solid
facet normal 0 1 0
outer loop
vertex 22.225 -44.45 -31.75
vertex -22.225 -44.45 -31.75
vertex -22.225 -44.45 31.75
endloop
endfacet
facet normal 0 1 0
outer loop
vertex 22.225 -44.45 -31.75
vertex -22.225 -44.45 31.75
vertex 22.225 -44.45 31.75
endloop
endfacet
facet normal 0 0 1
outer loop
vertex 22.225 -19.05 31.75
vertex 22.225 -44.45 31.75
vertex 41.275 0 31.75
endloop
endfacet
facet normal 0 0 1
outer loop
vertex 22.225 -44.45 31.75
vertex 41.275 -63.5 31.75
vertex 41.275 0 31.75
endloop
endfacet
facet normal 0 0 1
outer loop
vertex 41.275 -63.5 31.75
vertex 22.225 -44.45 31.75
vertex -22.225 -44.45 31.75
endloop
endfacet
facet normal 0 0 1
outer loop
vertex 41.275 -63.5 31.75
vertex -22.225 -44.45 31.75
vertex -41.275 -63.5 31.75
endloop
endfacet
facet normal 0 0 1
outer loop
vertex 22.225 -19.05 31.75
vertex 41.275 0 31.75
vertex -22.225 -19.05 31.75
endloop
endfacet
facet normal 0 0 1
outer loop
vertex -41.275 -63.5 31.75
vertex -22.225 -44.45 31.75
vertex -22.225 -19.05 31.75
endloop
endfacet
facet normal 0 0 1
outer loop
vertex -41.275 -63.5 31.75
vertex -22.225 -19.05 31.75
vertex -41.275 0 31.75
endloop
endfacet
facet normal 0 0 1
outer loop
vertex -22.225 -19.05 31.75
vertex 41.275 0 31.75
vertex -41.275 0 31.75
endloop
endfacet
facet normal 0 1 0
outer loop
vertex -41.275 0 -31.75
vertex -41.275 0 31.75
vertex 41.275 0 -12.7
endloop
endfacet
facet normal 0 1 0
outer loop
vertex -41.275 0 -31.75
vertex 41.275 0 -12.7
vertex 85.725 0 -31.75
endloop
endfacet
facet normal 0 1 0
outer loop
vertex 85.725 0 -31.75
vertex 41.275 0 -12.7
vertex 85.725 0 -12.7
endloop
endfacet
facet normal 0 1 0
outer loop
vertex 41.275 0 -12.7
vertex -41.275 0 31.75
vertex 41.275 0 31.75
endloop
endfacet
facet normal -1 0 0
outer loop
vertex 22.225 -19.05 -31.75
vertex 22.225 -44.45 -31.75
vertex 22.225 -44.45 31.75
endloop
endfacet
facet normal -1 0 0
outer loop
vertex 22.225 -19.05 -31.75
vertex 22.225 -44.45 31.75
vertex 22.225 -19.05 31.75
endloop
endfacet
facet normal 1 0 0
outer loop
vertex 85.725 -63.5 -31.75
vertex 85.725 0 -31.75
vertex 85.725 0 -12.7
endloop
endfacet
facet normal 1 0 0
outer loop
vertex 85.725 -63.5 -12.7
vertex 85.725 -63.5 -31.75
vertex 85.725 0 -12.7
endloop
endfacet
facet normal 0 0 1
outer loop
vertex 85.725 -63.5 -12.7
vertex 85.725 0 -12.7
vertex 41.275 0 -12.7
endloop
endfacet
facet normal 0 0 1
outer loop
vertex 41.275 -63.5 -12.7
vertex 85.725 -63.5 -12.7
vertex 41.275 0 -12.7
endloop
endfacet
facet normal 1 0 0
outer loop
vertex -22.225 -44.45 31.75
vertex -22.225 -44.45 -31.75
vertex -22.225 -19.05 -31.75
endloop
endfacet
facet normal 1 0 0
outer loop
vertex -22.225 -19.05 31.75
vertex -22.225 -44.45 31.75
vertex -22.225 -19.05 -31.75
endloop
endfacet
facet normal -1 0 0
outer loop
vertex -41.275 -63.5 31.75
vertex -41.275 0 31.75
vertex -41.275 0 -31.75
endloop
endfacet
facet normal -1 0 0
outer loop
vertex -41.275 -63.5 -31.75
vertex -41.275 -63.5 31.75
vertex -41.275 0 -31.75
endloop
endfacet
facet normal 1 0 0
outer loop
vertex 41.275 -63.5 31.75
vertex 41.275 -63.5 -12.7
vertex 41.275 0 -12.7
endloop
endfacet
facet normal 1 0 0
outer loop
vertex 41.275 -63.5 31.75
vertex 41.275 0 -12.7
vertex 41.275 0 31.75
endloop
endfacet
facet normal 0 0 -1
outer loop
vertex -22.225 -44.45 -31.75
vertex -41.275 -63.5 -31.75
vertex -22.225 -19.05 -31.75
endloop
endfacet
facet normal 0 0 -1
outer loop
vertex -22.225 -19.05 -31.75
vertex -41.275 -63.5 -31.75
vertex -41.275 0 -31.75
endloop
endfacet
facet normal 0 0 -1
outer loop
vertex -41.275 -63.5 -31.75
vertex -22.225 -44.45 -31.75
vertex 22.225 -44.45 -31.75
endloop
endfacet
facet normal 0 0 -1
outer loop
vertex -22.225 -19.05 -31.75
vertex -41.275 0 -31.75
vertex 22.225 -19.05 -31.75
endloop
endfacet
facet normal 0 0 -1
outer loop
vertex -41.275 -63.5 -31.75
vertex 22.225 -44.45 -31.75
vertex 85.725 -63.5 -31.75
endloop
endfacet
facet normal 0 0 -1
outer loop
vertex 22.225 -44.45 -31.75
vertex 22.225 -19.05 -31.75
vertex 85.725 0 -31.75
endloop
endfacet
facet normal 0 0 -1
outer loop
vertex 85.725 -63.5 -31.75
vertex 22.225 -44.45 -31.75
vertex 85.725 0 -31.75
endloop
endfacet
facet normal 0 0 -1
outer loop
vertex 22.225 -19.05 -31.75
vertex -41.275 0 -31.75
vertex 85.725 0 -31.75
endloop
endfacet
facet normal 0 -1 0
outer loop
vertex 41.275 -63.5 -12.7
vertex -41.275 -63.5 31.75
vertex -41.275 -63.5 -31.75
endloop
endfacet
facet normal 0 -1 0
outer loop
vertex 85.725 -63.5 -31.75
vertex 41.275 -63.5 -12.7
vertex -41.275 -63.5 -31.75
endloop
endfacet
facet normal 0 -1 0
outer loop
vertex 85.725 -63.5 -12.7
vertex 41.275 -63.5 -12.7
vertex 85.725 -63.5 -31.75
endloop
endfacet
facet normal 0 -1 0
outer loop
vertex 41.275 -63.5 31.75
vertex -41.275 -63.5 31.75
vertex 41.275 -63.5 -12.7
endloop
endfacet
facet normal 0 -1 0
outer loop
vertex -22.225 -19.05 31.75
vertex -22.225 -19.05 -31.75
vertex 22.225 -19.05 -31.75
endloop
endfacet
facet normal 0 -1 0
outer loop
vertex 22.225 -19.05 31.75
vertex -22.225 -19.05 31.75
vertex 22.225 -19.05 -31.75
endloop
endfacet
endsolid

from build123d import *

# Parameters (mm, degrees)
F1_DEPTH = 63.5
F2_W     = 44.45
F2_H     = 25.4
F3_DEPTH = 63.5


with BuildPart() as f1:
    # F0 (on Front) → F1 (new body)
    with BuildSketch(Plane.XZ):
        Polygon((-41.275, 31.75), (-41.275, -31.75), (41.275, -31.75), (85.725, -31.75), (85.725, -12.7), (41.275, -12.7), (41.275, 31.75), align=None)
    extrude(amount=F1_DEPTH)

    # F2 (on face) → F3 (cut)
    with BuildSketch(Plane.XY.offset(31.75)):
        with Locations((0, -31.75)):
            Rectangle(F2_W, F2_H)
    extrude(amount=-F3_DEPTH, mode=Mode.SUBTRACT)


solid = f1.part
